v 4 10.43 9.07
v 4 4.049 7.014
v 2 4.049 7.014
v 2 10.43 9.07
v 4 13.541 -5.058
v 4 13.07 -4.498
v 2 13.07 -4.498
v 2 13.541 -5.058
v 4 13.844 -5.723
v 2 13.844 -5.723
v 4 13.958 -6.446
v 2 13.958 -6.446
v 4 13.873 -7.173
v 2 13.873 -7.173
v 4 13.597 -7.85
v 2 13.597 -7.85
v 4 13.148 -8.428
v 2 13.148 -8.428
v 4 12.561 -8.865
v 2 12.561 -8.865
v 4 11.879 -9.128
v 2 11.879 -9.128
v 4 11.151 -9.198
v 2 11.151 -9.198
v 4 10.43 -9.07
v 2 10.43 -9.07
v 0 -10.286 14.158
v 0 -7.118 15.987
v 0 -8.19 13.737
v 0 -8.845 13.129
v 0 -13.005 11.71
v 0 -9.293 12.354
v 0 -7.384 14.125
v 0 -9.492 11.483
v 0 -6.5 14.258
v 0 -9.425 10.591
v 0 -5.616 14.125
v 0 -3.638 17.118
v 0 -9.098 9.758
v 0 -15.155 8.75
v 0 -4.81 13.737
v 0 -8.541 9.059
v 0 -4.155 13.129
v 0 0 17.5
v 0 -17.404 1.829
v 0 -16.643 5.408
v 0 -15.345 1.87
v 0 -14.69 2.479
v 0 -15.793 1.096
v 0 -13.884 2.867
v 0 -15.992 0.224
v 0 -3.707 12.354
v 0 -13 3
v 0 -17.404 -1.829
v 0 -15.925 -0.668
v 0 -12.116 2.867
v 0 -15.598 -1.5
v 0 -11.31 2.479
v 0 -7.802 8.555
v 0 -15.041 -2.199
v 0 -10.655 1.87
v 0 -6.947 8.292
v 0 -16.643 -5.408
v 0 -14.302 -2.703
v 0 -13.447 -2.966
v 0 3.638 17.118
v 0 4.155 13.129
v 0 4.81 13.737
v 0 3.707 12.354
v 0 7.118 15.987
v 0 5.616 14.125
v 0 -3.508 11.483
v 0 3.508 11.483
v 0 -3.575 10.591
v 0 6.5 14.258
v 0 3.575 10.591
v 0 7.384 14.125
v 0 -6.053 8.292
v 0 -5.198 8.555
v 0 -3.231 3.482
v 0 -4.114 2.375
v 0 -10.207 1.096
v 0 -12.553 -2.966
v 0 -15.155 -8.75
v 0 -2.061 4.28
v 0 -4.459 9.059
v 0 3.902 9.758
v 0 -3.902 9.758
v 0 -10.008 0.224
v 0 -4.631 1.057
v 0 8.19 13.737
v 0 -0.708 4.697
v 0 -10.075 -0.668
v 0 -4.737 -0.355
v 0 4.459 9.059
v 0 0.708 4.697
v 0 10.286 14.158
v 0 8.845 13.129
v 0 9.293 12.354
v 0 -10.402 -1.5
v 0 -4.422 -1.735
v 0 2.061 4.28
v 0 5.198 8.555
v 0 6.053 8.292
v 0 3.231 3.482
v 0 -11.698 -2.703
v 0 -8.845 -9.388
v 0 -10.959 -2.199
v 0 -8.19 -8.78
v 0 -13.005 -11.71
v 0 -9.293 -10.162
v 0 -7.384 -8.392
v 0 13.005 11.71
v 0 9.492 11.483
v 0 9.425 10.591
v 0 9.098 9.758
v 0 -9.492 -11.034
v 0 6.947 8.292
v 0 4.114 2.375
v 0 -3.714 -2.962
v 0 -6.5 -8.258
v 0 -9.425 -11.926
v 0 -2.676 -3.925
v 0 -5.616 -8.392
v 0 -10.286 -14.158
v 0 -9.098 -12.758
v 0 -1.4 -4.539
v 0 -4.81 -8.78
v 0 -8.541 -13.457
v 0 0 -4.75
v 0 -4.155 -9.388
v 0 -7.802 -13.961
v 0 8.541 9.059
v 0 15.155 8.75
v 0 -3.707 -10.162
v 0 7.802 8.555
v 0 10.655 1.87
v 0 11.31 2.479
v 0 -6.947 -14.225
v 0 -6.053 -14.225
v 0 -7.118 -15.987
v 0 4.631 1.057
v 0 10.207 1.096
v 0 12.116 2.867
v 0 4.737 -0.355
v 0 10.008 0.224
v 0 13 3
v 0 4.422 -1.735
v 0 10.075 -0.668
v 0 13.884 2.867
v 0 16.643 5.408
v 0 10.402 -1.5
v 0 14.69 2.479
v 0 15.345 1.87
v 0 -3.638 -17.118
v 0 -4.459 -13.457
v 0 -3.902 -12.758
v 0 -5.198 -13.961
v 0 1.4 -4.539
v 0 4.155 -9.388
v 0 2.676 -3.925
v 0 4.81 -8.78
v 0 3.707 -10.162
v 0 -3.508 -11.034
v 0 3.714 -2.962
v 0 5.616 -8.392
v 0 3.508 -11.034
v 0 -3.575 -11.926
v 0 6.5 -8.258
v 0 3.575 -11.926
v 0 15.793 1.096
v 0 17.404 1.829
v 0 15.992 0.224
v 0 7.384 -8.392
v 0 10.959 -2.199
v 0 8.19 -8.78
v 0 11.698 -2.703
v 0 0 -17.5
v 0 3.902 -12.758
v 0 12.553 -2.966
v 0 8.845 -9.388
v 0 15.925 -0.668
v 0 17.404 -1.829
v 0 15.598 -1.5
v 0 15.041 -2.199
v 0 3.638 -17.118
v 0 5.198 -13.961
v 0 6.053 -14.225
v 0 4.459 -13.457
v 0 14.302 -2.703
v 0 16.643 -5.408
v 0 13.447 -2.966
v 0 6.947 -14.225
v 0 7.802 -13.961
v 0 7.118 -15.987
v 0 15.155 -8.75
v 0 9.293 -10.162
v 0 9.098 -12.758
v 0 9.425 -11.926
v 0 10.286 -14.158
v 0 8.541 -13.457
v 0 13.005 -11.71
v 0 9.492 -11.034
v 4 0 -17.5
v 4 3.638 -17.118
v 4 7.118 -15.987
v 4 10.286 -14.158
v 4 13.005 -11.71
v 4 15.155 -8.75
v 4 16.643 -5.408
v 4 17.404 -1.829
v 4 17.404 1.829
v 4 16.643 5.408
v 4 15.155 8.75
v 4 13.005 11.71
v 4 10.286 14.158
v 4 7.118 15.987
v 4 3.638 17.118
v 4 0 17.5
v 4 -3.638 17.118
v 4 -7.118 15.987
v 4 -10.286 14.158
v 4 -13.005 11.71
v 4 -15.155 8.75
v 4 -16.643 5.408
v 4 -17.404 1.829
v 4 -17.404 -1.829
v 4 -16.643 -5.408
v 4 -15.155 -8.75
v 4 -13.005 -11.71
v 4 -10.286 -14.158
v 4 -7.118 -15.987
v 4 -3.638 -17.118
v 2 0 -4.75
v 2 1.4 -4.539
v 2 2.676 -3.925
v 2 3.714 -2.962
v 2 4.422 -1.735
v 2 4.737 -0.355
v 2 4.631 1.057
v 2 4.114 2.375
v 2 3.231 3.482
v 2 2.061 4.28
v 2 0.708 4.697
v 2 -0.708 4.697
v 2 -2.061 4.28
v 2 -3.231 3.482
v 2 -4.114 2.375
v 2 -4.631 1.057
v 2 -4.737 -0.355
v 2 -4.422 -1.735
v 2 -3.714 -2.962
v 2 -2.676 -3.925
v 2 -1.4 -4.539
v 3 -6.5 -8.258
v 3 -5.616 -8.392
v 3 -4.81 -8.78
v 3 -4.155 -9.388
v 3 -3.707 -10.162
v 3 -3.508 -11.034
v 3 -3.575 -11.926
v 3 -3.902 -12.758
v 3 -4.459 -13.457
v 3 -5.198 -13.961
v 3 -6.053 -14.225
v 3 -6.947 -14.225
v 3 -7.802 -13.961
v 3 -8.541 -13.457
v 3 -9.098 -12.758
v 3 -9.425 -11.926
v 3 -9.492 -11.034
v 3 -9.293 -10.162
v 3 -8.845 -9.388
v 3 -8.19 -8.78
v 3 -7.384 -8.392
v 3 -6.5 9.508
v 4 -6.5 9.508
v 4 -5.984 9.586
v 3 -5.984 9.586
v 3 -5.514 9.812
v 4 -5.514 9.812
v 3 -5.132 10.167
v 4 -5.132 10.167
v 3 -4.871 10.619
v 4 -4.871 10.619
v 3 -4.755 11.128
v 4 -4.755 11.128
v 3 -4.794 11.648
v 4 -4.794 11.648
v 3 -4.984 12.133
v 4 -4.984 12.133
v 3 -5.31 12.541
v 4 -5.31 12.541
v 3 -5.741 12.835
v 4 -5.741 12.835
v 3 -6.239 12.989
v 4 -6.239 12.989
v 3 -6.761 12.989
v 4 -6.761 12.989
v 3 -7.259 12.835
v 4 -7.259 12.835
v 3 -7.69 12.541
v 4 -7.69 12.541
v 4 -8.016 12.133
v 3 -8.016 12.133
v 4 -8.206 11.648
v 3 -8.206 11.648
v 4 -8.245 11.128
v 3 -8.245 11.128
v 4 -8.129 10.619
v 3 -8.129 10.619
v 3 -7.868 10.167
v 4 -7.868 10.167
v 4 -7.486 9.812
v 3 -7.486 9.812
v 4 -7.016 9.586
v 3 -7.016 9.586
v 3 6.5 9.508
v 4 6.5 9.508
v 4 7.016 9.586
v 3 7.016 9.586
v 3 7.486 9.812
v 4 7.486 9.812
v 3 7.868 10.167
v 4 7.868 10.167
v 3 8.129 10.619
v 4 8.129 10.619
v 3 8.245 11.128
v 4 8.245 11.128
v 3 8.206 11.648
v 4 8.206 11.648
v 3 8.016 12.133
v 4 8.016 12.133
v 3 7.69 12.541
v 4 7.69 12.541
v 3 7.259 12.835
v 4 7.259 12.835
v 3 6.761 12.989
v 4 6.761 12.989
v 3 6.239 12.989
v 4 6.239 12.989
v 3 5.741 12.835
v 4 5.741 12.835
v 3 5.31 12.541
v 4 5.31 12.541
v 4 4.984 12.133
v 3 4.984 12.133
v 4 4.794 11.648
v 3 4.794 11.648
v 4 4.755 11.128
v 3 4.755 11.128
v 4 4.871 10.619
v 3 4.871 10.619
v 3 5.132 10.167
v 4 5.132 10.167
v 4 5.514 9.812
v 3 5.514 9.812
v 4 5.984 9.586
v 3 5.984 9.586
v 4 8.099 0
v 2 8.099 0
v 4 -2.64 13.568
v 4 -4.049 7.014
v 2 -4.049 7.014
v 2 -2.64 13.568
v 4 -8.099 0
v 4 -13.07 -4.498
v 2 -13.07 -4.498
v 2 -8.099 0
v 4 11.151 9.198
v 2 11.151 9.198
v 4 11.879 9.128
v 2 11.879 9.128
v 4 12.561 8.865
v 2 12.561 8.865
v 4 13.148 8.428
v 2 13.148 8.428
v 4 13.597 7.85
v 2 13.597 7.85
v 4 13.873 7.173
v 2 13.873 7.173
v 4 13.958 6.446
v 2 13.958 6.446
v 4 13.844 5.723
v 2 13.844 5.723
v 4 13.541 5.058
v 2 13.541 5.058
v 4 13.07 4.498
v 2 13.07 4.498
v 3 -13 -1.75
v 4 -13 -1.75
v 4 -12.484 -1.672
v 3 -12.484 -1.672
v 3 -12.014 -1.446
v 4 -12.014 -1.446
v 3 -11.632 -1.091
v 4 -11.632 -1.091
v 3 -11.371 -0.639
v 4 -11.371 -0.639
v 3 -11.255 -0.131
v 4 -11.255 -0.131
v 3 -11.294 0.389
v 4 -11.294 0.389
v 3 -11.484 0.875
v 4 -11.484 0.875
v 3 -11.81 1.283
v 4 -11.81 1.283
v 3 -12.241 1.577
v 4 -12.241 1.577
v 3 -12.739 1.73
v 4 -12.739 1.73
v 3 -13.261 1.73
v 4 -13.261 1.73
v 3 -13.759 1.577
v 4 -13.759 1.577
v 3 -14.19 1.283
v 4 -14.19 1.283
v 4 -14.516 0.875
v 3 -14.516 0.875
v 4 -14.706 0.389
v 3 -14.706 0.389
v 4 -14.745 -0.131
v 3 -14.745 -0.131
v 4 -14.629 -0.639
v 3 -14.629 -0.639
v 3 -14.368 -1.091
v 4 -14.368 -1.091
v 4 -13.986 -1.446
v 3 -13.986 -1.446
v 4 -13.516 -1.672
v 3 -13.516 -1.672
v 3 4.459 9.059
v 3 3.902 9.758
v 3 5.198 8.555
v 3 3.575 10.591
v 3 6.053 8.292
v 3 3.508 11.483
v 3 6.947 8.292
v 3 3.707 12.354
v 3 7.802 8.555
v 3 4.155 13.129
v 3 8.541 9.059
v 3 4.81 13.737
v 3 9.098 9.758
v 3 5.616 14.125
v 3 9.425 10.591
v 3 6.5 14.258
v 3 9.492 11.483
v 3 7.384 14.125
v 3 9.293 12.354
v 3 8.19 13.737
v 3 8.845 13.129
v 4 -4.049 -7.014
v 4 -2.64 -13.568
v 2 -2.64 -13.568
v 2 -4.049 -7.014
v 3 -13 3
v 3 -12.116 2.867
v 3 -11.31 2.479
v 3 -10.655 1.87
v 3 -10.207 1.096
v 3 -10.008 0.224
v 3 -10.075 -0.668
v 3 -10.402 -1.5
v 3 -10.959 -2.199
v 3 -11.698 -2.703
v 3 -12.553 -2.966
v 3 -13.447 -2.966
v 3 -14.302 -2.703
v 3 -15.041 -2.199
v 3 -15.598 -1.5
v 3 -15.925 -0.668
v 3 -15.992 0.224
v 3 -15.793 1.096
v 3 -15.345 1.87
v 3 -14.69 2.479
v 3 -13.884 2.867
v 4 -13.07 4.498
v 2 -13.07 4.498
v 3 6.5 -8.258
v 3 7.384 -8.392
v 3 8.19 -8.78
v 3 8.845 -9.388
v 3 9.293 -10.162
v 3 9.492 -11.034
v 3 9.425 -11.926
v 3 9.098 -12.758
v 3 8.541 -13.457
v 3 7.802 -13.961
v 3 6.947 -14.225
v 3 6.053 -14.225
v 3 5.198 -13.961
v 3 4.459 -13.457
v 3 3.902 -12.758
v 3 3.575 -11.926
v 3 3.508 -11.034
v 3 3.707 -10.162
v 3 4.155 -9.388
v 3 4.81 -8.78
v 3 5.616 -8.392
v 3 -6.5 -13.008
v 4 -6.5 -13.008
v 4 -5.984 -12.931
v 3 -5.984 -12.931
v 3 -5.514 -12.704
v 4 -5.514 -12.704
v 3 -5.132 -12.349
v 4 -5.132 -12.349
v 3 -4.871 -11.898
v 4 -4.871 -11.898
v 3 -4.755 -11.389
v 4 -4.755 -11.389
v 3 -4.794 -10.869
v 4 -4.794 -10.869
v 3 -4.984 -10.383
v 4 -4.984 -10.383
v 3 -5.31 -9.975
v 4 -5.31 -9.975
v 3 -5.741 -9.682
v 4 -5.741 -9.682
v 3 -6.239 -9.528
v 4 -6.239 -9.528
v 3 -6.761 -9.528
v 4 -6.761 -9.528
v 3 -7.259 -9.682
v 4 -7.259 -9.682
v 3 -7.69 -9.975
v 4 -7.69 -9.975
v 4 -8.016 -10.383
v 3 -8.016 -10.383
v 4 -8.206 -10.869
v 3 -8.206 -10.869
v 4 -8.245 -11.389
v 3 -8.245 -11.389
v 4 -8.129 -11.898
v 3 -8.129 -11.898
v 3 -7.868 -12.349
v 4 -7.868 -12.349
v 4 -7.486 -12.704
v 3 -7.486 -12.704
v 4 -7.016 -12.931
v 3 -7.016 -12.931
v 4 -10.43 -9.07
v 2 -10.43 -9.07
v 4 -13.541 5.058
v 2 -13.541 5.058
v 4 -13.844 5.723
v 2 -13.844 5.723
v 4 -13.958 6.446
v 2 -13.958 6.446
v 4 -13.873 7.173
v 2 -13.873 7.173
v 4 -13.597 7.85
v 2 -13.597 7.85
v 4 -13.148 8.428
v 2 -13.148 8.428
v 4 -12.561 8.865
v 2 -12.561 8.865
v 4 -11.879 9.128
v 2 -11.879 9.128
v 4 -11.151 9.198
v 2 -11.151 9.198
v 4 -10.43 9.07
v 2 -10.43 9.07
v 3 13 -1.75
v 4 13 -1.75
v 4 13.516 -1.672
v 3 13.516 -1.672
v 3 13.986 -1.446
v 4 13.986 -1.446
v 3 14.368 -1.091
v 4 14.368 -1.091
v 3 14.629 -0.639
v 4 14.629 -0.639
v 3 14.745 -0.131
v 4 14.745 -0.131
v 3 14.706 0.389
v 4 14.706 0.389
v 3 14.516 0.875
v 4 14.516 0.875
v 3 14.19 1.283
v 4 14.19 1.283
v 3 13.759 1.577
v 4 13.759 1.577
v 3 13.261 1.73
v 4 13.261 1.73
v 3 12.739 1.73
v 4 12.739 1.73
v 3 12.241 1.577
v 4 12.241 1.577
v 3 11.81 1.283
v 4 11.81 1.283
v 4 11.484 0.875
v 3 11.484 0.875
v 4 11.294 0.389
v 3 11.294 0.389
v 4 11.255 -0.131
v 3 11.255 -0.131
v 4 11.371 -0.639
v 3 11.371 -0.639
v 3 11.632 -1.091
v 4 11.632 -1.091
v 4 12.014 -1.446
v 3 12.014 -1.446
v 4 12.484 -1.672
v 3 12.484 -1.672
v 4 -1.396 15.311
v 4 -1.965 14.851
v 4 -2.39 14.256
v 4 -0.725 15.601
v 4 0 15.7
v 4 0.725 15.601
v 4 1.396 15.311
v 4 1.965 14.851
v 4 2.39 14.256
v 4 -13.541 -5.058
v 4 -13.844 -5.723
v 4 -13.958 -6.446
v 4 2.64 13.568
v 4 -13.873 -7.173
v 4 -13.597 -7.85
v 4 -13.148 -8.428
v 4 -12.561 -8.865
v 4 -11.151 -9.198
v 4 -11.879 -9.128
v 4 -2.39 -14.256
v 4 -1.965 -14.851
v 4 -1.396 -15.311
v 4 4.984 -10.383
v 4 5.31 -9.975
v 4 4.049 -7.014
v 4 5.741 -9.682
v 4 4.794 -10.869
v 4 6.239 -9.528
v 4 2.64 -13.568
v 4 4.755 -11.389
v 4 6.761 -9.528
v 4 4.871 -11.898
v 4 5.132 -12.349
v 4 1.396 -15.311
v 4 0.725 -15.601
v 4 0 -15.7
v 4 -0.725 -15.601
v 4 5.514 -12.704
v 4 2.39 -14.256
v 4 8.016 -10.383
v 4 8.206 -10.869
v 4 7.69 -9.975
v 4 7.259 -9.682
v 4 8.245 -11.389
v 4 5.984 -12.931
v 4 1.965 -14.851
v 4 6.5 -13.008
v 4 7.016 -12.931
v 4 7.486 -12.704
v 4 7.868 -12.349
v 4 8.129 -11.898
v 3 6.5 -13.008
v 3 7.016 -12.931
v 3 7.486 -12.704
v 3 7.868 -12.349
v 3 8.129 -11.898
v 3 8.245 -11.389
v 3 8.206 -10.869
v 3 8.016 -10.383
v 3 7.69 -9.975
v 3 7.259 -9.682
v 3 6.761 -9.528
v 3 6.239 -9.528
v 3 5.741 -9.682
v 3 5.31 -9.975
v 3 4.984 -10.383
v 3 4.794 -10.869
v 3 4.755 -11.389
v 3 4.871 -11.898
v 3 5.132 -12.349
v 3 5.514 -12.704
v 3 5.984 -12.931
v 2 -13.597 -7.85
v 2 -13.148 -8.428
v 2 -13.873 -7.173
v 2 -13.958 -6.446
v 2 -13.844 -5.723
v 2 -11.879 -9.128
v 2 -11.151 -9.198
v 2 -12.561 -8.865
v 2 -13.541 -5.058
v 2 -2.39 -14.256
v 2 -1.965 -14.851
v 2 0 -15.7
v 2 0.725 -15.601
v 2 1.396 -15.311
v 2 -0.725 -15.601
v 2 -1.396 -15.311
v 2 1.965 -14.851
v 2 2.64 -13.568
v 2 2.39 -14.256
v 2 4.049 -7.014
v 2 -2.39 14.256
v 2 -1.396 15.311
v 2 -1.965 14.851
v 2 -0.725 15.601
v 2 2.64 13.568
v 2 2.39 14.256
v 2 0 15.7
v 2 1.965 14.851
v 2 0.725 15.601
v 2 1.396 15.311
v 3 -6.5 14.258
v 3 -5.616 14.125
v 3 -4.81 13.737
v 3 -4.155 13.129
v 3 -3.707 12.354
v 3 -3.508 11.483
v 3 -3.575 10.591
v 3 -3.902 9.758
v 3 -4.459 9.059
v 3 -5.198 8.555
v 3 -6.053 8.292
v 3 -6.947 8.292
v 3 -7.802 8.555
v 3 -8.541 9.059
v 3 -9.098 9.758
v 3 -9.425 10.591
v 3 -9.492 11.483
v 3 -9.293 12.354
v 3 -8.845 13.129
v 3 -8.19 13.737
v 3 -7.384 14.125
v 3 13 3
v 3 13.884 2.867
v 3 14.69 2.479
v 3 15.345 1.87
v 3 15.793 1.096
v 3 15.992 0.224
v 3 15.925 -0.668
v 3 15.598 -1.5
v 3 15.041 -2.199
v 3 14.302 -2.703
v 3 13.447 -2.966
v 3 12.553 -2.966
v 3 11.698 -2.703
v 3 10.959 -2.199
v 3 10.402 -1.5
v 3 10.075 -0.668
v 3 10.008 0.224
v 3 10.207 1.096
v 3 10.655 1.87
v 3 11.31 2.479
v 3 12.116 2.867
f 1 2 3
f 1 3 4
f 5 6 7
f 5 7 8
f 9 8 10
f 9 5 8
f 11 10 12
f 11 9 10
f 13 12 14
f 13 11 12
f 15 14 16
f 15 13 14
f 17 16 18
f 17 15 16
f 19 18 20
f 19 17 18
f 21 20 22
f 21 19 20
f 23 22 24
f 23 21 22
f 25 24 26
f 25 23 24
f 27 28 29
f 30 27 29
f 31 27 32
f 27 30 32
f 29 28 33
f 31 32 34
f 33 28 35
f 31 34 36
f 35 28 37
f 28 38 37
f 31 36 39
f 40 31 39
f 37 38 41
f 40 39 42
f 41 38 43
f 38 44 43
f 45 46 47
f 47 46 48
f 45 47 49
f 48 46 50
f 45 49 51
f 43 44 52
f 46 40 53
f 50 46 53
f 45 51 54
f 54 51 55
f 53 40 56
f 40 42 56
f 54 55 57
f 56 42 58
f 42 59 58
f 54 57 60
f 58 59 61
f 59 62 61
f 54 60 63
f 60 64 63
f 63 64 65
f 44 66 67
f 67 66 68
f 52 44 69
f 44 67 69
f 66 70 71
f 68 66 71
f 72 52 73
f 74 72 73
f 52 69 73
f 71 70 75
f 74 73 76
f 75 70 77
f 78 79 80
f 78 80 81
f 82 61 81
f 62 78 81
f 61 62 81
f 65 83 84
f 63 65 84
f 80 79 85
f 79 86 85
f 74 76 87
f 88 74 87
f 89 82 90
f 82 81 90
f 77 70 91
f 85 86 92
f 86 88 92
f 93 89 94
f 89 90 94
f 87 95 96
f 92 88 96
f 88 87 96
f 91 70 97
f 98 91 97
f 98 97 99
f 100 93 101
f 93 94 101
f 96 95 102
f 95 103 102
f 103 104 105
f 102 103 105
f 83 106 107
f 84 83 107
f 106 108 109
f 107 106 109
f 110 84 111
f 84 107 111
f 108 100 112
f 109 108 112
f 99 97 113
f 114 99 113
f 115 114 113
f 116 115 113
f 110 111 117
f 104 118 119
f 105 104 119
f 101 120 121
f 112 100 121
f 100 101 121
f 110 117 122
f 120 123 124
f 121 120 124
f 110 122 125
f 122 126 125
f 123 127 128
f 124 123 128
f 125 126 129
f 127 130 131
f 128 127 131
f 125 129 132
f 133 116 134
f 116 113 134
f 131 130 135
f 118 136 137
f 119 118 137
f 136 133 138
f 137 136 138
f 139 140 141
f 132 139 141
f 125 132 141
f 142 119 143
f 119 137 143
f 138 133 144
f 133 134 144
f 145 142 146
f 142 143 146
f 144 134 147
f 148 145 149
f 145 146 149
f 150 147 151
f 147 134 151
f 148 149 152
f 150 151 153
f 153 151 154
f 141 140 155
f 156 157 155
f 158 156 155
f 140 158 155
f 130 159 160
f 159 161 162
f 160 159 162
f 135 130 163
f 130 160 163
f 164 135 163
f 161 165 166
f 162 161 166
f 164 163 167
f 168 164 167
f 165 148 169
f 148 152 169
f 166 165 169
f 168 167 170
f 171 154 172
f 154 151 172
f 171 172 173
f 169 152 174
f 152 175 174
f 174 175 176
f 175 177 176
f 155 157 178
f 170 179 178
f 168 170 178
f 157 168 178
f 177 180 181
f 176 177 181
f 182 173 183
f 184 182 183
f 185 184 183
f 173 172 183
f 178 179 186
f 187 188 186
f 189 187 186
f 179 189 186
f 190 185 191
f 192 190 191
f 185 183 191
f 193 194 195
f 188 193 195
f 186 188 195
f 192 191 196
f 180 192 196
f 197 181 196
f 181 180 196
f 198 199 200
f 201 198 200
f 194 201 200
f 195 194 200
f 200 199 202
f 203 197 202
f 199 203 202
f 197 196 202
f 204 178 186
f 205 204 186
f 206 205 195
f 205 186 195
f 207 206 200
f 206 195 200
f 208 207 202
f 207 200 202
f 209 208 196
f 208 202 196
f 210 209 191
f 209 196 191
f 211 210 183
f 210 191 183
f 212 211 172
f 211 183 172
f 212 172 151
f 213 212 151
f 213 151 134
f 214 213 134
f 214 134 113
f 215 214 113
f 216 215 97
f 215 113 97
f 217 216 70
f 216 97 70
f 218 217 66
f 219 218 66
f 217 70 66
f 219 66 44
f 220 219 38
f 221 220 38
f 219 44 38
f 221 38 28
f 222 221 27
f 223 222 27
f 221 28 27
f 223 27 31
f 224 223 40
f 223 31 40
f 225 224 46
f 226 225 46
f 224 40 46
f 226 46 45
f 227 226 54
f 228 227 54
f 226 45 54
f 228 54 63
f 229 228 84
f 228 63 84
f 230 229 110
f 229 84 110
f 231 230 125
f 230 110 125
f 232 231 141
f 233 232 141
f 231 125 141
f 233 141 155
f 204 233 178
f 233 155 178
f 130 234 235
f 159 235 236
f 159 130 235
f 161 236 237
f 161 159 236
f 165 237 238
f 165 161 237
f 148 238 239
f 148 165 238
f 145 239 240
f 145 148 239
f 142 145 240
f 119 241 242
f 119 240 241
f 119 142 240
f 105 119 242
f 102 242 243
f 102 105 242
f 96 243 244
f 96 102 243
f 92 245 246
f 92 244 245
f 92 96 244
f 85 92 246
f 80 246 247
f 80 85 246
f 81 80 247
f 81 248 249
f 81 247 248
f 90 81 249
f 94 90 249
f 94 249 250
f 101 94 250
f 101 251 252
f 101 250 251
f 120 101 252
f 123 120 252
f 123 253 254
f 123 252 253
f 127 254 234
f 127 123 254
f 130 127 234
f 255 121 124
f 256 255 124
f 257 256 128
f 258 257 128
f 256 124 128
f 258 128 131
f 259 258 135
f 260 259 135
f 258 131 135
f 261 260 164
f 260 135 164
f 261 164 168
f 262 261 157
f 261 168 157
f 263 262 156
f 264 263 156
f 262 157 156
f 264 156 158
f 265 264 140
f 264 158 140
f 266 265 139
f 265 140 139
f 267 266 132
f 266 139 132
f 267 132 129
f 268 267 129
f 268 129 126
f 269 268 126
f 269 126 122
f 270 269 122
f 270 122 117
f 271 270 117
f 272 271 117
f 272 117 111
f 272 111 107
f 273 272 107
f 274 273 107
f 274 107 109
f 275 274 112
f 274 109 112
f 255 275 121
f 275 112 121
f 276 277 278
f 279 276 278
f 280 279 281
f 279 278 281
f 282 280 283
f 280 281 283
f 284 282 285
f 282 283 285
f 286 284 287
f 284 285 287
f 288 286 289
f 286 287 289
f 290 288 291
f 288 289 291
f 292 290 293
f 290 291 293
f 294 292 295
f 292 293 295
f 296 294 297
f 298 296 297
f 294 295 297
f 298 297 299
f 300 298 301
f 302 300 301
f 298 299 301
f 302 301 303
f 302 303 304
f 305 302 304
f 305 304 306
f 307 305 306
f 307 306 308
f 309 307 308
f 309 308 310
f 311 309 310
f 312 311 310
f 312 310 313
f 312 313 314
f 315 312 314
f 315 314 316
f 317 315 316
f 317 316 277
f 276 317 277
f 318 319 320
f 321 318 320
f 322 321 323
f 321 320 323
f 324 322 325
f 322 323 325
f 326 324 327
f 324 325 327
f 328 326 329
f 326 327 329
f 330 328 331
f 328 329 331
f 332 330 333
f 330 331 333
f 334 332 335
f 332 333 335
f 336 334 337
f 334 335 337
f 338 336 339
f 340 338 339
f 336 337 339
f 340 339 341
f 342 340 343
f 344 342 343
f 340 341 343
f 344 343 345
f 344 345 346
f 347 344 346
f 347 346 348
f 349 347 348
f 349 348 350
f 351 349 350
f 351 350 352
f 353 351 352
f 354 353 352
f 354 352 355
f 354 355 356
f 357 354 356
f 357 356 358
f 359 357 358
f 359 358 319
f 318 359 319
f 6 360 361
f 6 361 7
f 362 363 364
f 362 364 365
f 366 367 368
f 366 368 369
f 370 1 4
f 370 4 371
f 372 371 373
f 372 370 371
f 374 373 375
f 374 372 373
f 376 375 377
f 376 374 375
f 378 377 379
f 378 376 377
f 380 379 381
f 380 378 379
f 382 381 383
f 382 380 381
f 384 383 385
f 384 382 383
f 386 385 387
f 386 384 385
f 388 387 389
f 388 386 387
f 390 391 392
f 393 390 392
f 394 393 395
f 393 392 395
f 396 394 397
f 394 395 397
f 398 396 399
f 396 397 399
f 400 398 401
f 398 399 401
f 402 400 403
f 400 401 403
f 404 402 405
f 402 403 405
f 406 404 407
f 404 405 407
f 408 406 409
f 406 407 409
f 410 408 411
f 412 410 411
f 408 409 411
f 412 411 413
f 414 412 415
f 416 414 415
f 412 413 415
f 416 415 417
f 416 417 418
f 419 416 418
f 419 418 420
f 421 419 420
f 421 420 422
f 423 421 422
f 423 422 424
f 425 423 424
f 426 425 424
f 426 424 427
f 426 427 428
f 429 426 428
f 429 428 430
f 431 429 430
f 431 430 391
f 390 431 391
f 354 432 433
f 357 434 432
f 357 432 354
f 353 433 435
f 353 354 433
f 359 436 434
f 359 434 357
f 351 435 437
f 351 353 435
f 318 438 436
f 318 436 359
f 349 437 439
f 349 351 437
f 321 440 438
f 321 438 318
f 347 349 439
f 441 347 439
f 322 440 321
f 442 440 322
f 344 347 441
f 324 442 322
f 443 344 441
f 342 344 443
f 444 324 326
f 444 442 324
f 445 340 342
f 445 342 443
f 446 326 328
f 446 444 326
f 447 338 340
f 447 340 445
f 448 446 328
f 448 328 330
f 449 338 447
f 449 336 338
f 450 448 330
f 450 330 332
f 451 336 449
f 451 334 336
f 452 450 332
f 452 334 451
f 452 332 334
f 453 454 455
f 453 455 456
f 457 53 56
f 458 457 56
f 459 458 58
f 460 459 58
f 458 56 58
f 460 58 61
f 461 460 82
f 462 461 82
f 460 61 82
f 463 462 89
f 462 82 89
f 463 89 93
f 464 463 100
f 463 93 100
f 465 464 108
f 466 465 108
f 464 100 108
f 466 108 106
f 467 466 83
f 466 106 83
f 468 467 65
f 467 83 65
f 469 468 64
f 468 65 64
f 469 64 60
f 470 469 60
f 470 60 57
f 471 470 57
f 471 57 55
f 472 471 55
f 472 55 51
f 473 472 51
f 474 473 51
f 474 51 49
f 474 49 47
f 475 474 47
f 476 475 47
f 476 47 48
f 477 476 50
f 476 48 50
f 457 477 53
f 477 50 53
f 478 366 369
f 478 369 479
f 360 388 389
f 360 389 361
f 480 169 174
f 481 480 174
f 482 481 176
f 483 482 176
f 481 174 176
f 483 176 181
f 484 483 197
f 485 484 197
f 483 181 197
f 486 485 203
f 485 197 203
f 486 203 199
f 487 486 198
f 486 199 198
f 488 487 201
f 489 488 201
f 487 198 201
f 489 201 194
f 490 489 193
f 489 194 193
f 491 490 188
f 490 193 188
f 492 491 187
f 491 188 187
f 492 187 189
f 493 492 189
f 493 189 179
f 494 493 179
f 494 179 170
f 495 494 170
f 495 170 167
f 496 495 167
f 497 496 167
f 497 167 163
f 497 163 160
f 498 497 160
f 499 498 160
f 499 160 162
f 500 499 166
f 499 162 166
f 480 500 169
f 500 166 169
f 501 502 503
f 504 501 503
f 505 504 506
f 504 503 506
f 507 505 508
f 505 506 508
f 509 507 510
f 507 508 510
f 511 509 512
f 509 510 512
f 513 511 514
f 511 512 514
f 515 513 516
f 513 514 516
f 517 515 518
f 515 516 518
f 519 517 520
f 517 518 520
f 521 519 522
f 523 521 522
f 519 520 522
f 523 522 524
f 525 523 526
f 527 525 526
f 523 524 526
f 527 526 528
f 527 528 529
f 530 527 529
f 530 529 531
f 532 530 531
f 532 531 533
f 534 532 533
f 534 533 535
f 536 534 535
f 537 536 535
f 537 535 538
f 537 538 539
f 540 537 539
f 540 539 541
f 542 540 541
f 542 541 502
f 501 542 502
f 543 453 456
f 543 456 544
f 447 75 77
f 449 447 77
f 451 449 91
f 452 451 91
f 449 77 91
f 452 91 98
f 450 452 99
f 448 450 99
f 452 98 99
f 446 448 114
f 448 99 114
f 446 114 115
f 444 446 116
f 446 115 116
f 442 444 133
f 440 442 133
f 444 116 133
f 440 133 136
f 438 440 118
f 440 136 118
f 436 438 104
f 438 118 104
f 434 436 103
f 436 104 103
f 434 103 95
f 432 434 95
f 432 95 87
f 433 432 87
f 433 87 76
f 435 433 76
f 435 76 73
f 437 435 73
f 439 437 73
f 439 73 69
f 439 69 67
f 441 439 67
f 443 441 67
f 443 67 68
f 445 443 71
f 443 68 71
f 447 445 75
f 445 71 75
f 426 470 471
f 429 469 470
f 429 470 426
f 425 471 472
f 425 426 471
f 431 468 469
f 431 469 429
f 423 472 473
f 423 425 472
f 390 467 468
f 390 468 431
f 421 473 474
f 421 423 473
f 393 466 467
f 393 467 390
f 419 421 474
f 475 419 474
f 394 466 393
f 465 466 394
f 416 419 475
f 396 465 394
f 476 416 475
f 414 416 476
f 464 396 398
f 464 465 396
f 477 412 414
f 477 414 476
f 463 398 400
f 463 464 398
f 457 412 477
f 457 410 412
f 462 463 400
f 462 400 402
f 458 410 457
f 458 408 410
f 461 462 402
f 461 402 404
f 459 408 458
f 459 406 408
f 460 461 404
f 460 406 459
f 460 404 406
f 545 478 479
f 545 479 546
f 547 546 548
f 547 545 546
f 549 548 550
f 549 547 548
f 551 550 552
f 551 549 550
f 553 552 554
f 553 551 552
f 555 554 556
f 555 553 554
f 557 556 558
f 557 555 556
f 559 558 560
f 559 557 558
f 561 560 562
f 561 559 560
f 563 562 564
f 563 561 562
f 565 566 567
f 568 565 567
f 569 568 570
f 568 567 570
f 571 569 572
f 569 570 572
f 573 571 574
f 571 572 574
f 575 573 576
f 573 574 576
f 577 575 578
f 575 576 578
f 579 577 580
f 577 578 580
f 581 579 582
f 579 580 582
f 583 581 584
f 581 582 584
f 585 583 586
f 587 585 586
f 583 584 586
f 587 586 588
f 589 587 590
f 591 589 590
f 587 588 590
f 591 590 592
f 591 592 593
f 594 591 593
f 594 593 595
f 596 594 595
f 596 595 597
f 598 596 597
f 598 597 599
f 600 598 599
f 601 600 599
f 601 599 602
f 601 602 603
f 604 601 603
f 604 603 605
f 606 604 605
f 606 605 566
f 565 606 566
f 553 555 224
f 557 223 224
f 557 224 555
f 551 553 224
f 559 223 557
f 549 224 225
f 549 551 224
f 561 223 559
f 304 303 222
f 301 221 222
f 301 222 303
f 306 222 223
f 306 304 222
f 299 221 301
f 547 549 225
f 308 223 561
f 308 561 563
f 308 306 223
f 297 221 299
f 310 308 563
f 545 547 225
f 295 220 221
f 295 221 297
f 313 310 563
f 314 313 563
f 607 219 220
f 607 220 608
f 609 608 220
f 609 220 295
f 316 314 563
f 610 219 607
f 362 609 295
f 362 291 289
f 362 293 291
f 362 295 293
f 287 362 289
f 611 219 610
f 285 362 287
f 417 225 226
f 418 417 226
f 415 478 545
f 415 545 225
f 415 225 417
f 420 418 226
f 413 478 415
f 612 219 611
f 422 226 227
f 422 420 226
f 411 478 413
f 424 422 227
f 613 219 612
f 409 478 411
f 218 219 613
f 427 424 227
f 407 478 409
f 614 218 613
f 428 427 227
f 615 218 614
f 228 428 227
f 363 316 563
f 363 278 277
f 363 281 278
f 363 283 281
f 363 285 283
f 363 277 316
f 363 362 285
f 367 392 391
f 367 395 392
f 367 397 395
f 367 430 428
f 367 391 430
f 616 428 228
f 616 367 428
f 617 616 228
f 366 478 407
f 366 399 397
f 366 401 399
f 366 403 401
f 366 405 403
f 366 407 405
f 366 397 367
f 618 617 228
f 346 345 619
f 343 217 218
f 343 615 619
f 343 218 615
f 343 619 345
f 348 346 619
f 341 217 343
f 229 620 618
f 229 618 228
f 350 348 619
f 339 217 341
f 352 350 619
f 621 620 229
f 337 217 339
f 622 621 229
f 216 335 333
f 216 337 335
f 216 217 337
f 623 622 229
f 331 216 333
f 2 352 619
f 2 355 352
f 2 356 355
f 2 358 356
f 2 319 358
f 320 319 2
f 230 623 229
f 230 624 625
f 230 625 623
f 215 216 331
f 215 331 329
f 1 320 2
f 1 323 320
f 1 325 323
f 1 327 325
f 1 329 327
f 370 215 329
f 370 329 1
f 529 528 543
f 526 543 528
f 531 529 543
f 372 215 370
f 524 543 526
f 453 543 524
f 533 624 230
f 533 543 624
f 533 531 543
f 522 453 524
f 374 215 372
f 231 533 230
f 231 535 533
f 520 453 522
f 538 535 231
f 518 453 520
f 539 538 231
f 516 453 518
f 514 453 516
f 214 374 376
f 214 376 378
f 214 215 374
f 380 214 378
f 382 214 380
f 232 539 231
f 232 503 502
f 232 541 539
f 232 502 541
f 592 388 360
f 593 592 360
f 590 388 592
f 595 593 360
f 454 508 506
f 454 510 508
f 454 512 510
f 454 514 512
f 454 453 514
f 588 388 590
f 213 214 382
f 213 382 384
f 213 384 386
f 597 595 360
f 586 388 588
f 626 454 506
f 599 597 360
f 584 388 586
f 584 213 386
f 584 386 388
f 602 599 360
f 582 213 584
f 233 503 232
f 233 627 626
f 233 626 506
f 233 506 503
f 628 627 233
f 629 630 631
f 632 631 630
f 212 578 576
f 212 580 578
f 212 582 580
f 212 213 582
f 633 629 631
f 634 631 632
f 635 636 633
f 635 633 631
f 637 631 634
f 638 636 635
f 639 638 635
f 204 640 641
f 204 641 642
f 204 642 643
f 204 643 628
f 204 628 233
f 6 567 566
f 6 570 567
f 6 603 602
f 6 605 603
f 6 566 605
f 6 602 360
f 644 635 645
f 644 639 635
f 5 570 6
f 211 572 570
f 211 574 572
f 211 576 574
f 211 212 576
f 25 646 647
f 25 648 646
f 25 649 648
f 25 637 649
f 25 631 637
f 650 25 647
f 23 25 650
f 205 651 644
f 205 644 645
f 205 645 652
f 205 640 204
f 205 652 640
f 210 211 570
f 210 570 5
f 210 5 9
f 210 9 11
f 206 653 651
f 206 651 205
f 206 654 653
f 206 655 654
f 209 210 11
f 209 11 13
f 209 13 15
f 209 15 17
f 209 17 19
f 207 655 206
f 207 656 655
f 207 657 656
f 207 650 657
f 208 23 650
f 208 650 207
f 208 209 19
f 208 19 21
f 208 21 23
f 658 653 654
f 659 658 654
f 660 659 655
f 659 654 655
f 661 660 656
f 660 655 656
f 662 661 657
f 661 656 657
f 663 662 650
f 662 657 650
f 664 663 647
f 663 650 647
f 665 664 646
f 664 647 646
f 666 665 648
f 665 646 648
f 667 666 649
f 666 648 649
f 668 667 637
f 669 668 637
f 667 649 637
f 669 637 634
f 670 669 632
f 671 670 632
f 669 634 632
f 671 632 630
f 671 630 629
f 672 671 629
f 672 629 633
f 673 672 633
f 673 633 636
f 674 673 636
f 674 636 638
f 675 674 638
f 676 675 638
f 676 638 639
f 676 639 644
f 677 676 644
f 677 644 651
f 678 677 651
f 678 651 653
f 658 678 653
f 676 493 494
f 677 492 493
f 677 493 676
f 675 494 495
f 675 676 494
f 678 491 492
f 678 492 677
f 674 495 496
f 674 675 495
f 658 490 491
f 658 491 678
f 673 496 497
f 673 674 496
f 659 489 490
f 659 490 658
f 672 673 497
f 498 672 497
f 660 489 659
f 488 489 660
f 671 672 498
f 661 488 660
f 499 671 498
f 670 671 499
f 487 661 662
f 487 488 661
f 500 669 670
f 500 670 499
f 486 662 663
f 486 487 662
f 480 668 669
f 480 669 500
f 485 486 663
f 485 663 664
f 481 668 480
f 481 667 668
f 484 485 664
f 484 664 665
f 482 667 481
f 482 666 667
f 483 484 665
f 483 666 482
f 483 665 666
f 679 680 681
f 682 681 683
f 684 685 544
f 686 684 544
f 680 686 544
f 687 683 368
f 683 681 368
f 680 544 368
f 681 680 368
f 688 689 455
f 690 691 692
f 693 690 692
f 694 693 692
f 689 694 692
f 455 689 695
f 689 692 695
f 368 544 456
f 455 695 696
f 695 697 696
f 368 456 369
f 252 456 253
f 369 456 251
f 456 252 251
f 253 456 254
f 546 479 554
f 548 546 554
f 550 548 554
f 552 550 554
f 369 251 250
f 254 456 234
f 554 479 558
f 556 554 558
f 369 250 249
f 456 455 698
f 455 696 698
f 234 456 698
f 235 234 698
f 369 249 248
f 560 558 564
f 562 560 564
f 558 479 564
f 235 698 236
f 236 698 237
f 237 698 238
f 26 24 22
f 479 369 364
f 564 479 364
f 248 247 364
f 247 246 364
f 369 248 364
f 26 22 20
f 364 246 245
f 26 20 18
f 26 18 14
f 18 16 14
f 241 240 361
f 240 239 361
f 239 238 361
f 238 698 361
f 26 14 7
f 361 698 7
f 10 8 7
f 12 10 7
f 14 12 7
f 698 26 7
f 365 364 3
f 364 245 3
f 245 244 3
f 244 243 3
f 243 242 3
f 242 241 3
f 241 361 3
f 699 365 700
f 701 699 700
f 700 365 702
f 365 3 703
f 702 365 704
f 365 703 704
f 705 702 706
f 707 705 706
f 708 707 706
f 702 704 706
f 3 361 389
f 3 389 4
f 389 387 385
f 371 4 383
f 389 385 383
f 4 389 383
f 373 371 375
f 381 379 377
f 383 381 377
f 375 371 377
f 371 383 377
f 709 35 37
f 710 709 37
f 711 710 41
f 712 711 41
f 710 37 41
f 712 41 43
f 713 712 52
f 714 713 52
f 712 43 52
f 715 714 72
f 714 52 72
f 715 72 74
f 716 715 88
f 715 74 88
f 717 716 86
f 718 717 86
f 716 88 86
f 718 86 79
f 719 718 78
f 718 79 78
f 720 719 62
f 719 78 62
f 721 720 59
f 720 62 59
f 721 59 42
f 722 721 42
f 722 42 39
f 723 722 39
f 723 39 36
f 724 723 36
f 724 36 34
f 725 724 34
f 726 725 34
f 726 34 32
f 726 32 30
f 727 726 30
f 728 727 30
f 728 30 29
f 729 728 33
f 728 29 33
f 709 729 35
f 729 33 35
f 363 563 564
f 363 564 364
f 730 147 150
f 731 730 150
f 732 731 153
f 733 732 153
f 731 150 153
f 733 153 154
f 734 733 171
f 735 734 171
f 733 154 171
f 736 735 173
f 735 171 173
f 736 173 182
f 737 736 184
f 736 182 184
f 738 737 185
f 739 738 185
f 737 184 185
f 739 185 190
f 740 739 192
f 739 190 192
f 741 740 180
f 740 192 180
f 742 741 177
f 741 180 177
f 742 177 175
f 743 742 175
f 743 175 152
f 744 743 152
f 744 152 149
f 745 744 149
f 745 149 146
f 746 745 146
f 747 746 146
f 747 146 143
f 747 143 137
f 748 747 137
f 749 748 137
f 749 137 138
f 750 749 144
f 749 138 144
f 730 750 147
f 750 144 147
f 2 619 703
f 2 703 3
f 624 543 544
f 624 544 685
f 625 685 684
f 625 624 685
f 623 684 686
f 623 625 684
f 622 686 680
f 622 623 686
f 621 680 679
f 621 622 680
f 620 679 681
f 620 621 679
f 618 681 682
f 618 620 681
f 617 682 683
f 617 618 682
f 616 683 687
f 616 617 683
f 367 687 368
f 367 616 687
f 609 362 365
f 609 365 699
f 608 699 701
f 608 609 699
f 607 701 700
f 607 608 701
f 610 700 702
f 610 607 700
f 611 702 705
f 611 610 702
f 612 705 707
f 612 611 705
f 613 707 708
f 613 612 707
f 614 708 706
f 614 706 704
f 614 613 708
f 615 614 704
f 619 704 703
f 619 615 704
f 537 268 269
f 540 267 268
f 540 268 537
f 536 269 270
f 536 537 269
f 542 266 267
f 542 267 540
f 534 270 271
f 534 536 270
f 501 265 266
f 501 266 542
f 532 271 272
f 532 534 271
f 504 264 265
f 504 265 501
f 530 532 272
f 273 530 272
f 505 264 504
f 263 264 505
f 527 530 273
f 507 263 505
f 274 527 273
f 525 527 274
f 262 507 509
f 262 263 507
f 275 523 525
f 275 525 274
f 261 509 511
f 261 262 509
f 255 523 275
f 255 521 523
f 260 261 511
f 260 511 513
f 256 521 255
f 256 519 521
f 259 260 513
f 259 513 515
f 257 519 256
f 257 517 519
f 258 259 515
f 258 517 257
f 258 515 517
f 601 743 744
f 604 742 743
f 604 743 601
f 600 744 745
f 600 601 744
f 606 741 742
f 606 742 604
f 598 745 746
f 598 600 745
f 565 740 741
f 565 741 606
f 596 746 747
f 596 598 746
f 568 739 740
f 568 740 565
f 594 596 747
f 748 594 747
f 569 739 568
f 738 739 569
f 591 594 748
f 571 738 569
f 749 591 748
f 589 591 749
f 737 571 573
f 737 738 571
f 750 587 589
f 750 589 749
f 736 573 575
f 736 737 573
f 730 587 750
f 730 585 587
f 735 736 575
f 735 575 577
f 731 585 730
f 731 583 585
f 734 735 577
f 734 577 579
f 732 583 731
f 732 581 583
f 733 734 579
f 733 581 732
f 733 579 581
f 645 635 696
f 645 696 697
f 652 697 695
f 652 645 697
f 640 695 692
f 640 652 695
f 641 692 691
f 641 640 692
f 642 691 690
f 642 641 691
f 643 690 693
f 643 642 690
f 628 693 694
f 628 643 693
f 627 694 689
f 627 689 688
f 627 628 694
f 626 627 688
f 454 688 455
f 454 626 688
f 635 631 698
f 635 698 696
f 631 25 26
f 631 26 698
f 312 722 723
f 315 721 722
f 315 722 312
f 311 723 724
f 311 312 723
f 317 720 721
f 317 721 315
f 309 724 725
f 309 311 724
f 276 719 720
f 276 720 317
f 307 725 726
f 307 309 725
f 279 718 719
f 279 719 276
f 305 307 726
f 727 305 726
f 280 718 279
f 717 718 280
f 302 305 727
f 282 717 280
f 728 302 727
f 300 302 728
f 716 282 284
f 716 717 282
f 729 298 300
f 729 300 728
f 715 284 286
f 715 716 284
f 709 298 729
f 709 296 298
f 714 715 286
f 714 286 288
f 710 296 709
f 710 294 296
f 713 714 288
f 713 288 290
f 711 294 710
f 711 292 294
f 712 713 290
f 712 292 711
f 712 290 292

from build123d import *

# Parameters (mm, degrees)
SKETCH1_R           = 17.5
SKETCH1_R_2         = 4.75
BOSS_EXTRUDE1_DEPTH = 4
CUT_EXTRUDE1_DEPTH  = 2
SKETCH3_R           = 1.75
CUT_EXTRUDE2_DEPTH  = 26.069902273
SKETCH4_R           = 3
CUT_EXTRUDE3_DEPTH  = 3


with BuildPart() as part:
    # Sketch1 → Boss-Extrude1 (new body)
    with BuildSketch(Plane(origin=(0, 0, 0), x_dir=(0, 0, -1), z_dir=(1, 0, 0))):
        Circle(SKETCH1_R)
        Circle(SKETCH1_R_2, mode=Mode.SUBTRACT)
    extrude(amount=BOSS_EXTRUDE1_DEPTH)

    # Sketch2 → Cut-Extrude1 (cut)
    with BuildSketch(Plane(origin=(4, 0, 0), x_dir=(0, 0, -1), z_dir=(1, 0, 0))):
        with BuildLine():
            Line((13.567828444, -2.639615665), (7.013907066, -4.049481133))
            Line((7.013907066, -4.049481133), (9.069888444, -10.430276274))
            ThreePointArc((9.069888444, -10.430276274), (7.85, -13.596598839), (4.49794, -13.069891939))
            Line((4.49794, -13.069891939), (0, -8.098962266))
            Line((0, -8.098962266), (-4.49794, -13.069891939))
            ThreePointArc((-4.49794, -13.069891939), (-7.85, -13.596598839), (-9.069888444, -10.430276274))
            Line((-9.069888444, -10.430276274), (-7.013907066, -4.049481133))
            Line((-7.013907066, -4.049481133), (-13.567828444, -2.639615665))
            ThreePointArc((-13.567828444, -2.639615665), (-15.7, 0), (-13.567828444, 2.639615665))
            Line((-13.567828444, 2.639615665), (-7.013907066, 4.049481133))
            Line((-7.013907066, 4.049481133), (-9.069888444, 10.430276274))
            ThreePointArc((-9.069888444, 10.430276274), (-7.85, 13.596598839), (-4.49794, 13.069891939))
            Line((-4.49794, 13.069891939), (0, 8.098962266))
            Line((0, 8.098962266), (4.49794, 13.069891939))
            ThreePointArc((4.49794, 13.069891939), (7.85, 13.596598839), (9.069888444, 10.430276274))
            Line((9.069888444, 10.430276274), (7.013907066, 4.049481133))
            Line((7.013907066, 4.049481133), (13.567828444, 2.639615665))
            ThreePointArc((13.567828444, 2.639615665), (15.7, 0), (13.567828444, -2.639615665))
        make_face()
    extrude(amount=-CUT_EXTRUDE1_DEPTH, mode=Mode.SUBTRACT)

    # Sketch3 → Cut-Extrude2 (cut, through all)
    with BuildSketch(Plane(origin=(4, 0, 0), x_dir=(0, 0, -1), z_dir=(1, 0, 0))):
        with Locations((0, 13)):
            Circle(SKETCH3_R)
        with Locations((11.258330249, 6.5)):
            Circle(SKETCH3_R)
        with Locations((11.258330249, -6.5)):
            Circle(SKETCH3_R)
        with Locations((0, -13)):
            Circle(SKETCH3_R)
        with Locations((-11.258330249, -6.5)):
            Circle(SKETCH3_R)
        with Locations((-11.258330249, 6.5)):
            Circle(SKETCH3_R)
    extrude(amount=-CUT_EXTRUDE2_DEPTH, mode=Mode.SUBTRACT)

    # Sketch4 → Cut-Extrude3 (cut)
    with BuildSketch(Plane.ZY):
        with Locations((-11.258330249, 6.5)):
            Circle(SKETCH4_R)
        with Locations((0, 13)):
            Circle(SKETCH4_R)
        with Locations((11.258330249, 6.5)):
            Circle(SKETCH4_R)
        with Locations((11.258330249, -6.5)):
            Circle(SKETCH4_R)
        with Locations((0, -13)):
            Circle(SKETCH4_R)
        with Locations((-11.258330249, -6.5)):
            Circle(SKETCH4_R)
    extrude(amount=-CUT_EXTRUDE3_DEPTH, mode=Mode.SUBTRACT)


solid = part.part
